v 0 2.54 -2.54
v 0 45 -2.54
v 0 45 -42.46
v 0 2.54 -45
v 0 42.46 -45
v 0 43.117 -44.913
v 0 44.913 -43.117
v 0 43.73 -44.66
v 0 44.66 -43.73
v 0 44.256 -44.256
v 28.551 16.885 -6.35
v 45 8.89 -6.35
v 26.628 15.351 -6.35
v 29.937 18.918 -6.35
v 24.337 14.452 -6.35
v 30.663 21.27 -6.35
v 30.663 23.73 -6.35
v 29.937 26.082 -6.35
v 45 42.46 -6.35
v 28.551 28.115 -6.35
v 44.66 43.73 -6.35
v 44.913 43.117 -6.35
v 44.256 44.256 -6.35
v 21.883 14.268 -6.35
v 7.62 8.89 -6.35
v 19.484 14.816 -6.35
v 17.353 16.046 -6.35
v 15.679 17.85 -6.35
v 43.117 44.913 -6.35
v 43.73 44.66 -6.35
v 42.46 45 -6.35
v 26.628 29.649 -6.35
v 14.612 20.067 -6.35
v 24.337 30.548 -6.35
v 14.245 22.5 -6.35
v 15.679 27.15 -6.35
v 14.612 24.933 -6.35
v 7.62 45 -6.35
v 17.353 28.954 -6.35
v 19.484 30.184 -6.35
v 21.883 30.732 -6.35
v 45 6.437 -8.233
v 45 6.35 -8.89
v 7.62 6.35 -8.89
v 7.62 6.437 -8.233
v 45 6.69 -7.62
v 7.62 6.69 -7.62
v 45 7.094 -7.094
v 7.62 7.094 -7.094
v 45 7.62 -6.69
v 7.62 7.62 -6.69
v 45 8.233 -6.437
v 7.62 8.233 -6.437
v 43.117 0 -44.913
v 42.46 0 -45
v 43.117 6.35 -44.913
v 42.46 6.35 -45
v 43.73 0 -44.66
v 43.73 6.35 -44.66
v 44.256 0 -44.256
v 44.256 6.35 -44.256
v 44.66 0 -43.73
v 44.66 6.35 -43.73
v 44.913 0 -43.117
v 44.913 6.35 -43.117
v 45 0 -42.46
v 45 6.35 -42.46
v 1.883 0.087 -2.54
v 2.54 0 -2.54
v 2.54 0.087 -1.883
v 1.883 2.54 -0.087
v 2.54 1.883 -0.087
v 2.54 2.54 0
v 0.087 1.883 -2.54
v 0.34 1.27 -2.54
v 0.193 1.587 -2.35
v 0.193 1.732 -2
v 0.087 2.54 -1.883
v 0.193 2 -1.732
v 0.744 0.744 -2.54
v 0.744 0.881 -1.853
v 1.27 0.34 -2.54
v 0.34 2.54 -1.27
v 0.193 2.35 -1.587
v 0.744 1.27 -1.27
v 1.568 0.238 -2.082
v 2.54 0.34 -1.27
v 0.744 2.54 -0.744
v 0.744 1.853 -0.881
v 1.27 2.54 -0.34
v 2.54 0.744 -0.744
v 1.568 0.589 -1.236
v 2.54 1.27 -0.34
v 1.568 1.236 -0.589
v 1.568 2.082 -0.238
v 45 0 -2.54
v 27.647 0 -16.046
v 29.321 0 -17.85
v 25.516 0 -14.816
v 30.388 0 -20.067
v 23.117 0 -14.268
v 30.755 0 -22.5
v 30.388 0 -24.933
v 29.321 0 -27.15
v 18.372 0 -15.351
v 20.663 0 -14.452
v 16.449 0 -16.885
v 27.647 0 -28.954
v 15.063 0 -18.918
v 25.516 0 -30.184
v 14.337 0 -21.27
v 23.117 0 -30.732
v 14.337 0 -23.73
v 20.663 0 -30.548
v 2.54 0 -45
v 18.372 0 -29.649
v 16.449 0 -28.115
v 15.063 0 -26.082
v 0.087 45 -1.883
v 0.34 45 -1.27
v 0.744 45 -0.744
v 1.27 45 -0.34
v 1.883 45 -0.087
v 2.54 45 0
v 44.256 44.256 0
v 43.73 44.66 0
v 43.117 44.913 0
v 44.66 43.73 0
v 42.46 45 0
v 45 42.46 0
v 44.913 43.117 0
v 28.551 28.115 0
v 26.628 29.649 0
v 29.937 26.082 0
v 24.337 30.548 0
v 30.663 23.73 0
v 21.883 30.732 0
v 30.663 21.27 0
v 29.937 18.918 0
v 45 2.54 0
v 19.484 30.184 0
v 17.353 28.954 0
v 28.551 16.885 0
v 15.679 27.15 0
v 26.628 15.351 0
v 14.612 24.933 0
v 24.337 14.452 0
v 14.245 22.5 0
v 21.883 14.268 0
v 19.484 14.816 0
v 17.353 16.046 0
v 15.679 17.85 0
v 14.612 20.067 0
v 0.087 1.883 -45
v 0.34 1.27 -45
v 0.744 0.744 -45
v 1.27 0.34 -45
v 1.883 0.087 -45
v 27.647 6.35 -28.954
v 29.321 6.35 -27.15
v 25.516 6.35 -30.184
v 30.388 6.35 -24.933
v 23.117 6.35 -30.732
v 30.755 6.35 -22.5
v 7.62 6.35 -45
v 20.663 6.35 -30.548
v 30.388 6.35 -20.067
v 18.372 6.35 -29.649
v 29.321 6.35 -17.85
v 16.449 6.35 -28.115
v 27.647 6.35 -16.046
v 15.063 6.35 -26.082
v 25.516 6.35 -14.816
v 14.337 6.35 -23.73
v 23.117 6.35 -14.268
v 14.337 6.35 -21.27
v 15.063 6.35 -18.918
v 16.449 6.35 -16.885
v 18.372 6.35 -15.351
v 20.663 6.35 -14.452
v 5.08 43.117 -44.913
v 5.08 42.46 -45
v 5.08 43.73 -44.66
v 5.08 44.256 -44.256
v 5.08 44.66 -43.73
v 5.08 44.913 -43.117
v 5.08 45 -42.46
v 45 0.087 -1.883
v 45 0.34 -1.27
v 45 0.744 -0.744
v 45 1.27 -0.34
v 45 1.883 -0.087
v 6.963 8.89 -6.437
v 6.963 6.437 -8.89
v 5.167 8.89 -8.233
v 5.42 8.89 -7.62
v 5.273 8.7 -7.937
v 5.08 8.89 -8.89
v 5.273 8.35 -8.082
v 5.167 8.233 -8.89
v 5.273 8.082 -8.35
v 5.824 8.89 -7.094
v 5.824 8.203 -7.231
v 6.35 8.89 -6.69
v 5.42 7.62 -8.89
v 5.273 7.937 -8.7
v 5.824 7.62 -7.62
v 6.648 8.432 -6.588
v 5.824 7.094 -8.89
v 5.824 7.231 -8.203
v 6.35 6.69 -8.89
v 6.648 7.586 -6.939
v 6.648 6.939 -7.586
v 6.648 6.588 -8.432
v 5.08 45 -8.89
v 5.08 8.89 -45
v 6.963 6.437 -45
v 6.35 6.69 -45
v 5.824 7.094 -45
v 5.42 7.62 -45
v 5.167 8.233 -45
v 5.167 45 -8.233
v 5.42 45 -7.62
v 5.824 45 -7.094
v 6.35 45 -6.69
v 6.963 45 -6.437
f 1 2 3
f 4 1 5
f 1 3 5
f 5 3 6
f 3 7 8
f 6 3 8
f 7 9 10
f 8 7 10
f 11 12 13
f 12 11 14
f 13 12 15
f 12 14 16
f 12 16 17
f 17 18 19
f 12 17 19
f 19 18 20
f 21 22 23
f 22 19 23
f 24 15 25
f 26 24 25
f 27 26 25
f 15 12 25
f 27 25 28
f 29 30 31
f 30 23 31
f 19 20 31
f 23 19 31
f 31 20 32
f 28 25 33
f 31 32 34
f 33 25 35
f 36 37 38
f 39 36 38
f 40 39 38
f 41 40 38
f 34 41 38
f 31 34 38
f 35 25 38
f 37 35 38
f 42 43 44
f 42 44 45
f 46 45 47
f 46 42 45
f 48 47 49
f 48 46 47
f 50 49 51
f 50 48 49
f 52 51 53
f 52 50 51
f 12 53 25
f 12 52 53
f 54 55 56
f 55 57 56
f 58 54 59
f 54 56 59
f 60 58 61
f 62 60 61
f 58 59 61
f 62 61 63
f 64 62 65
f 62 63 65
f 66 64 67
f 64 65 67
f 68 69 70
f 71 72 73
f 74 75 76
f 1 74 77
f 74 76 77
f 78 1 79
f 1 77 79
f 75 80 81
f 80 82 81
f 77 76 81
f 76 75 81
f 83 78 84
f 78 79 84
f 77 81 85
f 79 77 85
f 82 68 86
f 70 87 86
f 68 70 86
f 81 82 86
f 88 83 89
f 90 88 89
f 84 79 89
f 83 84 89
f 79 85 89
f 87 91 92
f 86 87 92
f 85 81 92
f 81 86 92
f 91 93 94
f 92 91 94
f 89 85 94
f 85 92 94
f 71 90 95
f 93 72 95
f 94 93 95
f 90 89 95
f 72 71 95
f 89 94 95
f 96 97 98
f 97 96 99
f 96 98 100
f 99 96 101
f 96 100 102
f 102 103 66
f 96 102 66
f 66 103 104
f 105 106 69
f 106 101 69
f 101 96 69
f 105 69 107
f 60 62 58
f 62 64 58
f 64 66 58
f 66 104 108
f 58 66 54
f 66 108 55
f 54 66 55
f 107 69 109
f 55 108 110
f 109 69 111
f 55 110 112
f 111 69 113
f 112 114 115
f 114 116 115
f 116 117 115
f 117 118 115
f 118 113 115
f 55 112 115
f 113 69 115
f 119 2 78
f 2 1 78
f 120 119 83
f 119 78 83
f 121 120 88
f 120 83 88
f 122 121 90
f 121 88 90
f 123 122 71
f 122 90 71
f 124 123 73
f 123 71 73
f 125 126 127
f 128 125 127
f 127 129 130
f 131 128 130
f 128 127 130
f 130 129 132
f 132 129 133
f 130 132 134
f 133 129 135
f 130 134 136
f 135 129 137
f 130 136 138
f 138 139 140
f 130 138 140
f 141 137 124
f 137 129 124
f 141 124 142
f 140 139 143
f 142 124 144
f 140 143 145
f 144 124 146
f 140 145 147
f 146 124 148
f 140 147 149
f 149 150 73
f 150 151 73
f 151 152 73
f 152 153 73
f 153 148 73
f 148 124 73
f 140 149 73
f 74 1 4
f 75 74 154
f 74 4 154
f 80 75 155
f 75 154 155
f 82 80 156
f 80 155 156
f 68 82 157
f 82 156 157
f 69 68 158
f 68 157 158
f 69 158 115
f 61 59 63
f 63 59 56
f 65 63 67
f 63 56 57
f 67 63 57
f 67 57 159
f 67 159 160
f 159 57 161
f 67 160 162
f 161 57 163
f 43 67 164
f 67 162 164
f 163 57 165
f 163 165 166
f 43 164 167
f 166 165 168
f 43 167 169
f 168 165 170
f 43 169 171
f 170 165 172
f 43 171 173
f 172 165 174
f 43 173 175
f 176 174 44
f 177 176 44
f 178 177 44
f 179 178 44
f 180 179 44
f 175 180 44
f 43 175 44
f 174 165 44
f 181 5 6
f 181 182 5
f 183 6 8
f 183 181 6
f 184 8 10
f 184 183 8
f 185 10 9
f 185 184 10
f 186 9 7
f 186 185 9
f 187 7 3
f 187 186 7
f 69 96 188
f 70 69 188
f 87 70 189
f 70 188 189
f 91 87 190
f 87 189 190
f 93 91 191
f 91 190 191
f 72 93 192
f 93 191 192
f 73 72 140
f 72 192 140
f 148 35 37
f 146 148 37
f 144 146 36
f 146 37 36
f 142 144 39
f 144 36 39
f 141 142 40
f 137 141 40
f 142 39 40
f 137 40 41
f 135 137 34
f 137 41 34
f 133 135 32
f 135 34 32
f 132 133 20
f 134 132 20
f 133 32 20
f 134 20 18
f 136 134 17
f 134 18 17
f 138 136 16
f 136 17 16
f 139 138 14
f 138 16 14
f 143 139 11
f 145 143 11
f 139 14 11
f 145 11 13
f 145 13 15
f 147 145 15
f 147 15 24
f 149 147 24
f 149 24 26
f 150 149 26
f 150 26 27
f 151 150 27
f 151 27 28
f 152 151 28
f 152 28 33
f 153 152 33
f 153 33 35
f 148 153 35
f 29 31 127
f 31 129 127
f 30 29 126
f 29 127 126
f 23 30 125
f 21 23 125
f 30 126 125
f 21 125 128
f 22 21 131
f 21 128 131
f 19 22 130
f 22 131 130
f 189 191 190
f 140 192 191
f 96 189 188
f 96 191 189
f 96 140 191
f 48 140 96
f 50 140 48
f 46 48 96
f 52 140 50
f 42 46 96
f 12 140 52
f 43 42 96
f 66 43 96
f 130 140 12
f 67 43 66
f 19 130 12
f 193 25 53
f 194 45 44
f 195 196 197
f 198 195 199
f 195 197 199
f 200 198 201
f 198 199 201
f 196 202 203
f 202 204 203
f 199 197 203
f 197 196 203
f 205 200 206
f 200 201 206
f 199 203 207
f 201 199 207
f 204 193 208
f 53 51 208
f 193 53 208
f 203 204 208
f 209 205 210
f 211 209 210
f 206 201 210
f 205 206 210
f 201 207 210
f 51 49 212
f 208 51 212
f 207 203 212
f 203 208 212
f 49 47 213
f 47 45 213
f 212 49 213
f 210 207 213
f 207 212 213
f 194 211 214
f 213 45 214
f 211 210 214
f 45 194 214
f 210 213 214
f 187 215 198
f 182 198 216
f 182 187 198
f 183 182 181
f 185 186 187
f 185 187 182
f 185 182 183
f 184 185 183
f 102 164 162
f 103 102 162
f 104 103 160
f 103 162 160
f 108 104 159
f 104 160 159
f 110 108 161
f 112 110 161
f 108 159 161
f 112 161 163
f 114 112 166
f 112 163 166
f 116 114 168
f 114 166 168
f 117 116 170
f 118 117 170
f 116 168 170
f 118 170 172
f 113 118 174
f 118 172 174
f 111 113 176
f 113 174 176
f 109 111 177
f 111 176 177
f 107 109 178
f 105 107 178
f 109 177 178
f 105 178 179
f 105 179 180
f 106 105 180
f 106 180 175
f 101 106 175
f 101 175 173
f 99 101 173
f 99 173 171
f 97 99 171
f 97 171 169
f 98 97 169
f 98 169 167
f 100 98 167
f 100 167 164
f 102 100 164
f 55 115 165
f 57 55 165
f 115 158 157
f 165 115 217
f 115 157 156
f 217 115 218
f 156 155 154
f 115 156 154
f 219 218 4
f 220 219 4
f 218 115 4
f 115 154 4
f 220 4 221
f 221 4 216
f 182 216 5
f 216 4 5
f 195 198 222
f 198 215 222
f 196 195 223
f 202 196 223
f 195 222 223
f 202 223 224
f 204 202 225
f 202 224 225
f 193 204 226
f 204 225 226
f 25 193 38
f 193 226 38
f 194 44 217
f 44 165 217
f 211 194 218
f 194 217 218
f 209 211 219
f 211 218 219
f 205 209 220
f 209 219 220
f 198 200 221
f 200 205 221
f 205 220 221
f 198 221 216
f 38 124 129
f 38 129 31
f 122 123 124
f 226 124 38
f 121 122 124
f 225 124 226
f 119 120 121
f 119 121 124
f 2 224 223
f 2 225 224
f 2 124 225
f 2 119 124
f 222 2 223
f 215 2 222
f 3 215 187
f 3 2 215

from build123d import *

# Parameters (mm, degrees)
BOSS_EXTRUDE1_DEPTH = 45
SKETCH3_R           = 8.255
CUT_EXTRUDE1_DEPTH  = 75.456849826
SKETCH2_3_W         = 38.649999916
SKETCH2_3_H         = 38.649999916
BOSS_EXTRUDE2_DEPTH = 5.08
SKETCH4_R           = 8.255
CUT_EXTRUDE2_DEPTH  = 75.456849826
FILLET1_R           = 2.54


with BuildPart() as part:
    # Sketch2 → Boss-Extrude1 (new body)
    with BuildSketch(Plane(origin=(0, 0, 0), x_dir=(0, 0, -1), z_dir=(1, 0, 0))):
        Polygon((0, 0), (44.999999916, 0), (44.999999916, 6.35), (6.35, 6.35), (6.35, 44.999999916), (0, 44.999999916), align=None)
    extrude(amount=BOSS_EXTRUDE1_DEPTH)

    # Sketch3 → Cut-Extrude1 (cut, through all)
    with BuildSketch(Plane(origin=(0, 6.35, 0), x_dir=(1, 0, 0), z_dir=(0, 1, 0))):
        with Locations((22.5, 22.499999958)):
            Circle(SKETCH3_R)
    extrude(amount=-CUT_EXTRUDE1_DEPTH, mode=Mode.SUBTRACT)

    # Sketch2<3> → Boss-Extrude2 (add)
    with BuildSketch(Plane(origin=(0, 0, 0), x_dir=(0, 0, -1), z_dir=(1, 0, 0))):
        with Locations((25.674999958, 25.674999958)):
            Rectangle(SKETCH2_3_W, SKETCH2_3_H)
    extrude(amount=BOSS_EXTRUDE2_DEPTH)

    # Sketch4 → Cut-Extrude2 (cut, through all)
    with BuildSketch(Plane(origin=(0, 0, -6.35), x_dir=(-1, 0, 0), z_dir=(0, 0, -1))):
        with Locations((-22.5, 22.499999958)):
            Circle(SKETCH4_R)
    extrude(amount=-CUT_EXTRUDE2_DEPTH, mode=Mode.SUBTRACT)

    # Fillet1
    fillet1_edges = [part.edges().sort_by_distance(p)[0] for p in [
        (45, 3.175, -44.999999916),
        (45, 44.999999916, -3.175),
        (25.04, 6.35, -6.35),
        (5.08, 6.35, -25.674999958),
        (5.08, 25.674999958, -6.35),
        (2.54, 44.999999916, -44.999999916),
        (0, 22.499999958, 0),
        (22.5, 0, 0),
        (0, 0, -22.499999958),
    ]]
    fillet(fillet1_edges, radius=FILLET1_R)


solid = part.part
